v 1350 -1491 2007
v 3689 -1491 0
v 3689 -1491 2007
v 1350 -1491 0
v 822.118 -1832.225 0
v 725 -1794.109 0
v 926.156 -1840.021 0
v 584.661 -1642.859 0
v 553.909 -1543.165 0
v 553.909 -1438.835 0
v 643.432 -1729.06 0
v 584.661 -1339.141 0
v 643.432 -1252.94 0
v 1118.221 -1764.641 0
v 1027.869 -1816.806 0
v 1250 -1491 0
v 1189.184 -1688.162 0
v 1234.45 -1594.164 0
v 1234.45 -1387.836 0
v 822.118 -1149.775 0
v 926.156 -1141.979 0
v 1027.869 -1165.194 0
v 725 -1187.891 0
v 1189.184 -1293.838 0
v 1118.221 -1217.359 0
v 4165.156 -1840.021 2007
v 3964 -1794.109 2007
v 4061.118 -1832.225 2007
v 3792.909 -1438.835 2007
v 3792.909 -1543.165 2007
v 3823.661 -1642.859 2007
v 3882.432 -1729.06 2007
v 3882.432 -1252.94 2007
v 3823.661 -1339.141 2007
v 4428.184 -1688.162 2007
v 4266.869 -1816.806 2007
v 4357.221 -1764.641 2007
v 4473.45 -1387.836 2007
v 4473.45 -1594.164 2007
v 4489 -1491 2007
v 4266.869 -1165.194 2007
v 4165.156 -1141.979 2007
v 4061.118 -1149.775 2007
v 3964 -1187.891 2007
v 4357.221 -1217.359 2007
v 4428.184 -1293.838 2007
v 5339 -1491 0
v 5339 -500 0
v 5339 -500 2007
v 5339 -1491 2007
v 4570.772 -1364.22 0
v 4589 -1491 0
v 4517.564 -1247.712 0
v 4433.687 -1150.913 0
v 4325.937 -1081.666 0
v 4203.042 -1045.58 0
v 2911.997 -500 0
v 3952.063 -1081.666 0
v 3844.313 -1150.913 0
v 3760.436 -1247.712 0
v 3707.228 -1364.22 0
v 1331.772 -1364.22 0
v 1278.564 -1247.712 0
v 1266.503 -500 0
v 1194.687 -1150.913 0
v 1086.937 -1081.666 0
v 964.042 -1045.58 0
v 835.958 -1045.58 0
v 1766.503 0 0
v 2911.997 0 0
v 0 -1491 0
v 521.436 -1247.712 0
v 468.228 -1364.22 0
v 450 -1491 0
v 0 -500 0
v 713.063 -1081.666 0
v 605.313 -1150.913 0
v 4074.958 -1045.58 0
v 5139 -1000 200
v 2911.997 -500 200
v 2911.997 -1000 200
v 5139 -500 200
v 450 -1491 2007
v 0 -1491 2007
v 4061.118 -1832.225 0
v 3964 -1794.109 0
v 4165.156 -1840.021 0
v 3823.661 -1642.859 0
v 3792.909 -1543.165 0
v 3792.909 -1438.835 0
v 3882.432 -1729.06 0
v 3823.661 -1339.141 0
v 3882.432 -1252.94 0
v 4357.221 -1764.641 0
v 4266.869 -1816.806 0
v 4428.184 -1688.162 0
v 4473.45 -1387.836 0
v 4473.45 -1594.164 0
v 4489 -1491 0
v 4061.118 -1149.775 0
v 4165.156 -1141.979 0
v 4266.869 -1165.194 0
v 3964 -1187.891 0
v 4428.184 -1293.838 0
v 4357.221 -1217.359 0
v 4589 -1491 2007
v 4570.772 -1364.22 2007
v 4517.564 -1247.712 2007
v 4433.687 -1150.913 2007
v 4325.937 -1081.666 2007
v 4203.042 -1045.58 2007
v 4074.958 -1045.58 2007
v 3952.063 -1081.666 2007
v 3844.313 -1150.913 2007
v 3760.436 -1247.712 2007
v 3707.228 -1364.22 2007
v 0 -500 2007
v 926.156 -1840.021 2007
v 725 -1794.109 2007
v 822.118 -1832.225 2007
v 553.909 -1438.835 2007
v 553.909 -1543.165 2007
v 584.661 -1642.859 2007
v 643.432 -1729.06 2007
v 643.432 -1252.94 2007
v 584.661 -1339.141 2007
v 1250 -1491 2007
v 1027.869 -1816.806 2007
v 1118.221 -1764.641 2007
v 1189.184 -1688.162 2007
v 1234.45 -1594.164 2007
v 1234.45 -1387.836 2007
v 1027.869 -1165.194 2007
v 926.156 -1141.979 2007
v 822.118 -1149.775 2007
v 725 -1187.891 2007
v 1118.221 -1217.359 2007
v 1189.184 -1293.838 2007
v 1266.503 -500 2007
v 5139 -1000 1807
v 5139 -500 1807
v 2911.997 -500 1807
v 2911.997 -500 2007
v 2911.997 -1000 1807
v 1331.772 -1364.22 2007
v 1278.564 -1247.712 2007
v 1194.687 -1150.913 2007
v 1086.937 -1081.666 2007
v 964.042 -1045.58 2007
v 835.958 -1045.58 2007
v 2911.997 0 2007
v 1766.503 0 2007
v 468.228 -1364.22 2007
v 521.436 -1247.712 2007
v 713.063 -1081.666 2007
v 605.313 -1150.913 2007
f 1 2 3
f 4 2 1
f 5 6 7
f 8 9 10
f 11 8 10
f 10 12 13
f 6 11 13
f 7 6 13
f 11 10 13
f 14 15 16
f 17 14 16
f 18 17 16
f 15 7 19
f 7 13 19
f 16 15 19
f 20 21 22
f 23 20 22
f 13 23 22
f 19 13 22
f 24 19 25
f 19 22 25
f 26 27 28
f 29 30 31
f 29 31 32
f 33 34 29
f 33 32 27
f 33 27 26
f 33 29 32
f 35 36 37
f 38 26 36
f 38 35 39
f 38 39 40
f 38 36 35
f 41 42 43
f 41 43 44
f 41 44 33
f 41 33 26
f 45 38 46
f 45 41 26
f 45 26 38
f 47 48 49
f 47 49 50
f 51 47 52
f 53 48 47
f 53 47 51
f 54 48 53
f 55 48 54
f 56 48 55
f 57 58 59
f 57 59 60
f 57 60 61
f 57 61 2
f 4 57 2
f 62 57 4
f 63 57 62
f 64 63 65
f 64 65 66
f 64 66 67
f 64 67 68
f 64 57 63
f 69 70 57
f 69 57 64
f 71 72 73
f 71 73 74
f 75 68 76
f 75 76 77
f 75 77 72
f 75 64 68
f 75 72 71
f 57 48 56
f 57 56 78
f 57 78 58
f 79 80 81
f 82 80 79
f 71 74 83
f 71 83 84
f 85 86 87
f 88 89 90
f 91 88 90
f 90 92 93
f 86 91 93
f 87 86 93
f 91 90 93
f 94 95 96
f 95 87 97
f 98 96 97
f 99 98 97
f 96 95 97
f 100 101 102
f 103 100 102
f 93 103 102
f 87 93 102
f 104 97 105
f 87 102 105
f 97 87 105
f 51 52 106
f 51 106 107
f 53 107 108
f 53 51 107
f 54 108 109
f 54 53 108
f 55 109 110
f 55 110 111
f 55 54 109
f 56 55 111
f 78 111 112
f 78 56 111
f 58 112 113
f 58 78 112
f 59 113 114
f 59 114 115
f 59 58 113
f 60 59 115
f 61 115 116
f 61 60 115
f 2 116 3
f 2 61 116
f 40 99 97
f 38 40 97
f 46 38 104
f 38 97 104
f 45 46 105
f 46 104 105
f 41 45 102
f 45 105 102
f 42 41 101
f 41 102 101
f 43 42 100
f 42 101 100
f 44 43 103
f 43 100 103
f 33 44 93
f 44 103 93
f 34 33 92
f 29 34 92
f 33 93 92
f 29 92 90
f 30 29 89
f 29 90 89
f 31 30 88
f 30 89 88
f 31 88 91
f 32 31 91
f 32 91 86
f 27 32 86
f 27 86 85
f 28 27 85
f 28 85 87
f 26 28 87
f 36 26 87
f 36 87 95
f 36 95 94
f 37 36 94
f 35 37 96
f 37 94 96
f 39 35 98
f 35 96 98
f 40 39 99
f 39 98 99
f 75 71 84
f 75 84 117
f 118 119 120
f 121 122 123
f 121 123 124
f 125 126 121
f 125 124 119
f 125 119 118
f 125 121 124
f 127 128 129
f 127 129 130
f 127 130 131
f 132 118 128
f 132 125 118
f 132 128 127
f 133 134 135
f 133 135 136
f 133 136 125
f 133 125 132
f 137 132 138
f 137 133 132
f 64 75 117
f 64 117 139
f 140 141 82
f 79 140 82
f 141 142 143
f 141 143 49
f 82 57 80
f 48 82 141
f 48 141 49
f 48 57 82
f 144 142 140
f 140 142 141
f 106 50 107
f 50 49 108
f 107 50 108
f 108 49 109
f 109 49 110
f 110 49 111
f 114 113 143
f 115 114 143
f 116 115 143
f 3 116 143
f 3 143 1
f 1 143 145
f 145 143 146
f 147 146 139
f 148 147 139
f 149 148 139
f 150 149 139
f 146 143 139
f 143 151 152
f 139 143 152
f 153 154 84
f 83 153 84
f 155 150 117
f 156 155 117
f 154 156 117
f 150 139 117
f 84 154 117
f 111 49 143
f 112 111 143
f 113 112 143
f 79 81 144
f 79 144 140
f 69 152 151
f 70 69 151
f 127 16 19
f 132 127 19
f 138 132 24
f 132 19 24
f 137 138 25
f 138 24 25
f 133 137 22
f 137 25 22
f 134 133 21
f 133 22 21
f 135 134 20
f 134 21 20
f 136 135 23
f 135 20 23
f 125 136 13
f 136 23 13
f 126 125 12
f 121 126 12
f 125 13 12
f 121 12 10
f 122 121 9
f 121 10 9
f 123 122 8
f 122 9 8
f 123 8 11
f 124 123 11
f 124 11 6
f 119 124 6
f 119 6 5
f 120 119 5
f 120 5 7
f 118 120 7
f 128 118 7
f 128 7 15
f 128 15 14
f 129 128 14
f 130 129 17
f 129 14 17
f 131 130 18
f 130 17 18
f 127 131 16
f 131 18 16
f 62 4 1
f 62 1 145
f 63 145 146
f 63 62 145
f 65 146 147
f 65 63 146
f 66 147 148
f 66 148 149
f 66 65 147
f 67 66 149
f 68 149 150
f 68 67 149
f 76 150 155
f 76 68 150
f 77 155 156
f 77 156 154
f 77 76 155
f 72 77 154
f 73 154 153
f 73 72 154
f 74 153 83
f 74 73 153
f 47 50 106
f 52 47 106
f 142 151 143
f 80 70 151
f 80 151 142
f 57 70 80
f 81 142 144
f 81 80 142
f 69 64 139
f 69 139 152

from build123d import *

# Parameters (mm, degrees)
BOSS_EXTRUDE1_DEPTH   = 2007
SKETCH1_R             = 350
BOSS_EXTRUDE1_2_DEPTH = 2007
BOSS_EXTRUDE1_3_DEPTH = 2007
SKETCH2_W             = 2227.003117431
SKETCH2_H             = 1607
CUT_EXTRUDE1_DEPTH    = 500


with BuildPart() as part:
    # Sketch1 → Boss-Extrude1 (new body)
    with BuildSketch(Plane.XY):
        with BuildLine():
            ThreePointArc((4589, -1491), (4139, -1041), (3689, -1491))
            Line((3689, -1491), (1350, -1491))
            ThreePointArc((1350, -1491), (900, -1041), (450, -1491))
            Line((450, -1491), (0, -1491))
            Line((0, -1491), (0, -500))
            Line((0, -500), (1266.50347674, -500))
            Line((1266.50347674, -500), (1766.50347674, 0))
            Line((1766.50347674, 0), (2911.996882569, 0))
            Line((2911.996882569, 0), (2911.996882569, -500))
            Line((2911.996882569, -500), (5339, -500))
            Line((5339, -500), (5339, -1491))
            Line((5339, -1491), (4589, -1491))
        make_face()
    extrude(amount=BOSS_EXTRUDE1_DEPTH)

    # Sketch2 → Cut-Extrude1 (cut)
    with BuildSketch(Plane(origin=(0, -500, 0), x_dir=(1, 0, 0), z_dir=(0, 1, 0))):
        with Locations((4025.498441285, -1003.5)):
            Rectangle(SKETCH2_W, SKETCH2_H)
    extrude(amount=-CUT_EXTRUDE1_DEPTH, mode=Mode.SUBTRACT)


with BuildPart() as body_2:
    # Sketch1 → Boss-Extrude1 2 (new body)
    with BuildSketch(Plane.XY):
        with Locations((900, -1491)):
            Circle(SKETCH1_R)
    extrude(amount=BOSS_EXTRUDE1_2_DEPTH)


with BuildPart() as body_3:
    # Sketch1 → Boss-Extrude1 3 (new body)
    with BuildSketch(Plane.XY):
        with Locations((4139, -1491)):
            Circle(SKETCH1_R)
    extrude(amount=BOSS_EXTRUDE1_3_DEPTH)


solid = Compound([part.part, body_2.part, body_3.part])
